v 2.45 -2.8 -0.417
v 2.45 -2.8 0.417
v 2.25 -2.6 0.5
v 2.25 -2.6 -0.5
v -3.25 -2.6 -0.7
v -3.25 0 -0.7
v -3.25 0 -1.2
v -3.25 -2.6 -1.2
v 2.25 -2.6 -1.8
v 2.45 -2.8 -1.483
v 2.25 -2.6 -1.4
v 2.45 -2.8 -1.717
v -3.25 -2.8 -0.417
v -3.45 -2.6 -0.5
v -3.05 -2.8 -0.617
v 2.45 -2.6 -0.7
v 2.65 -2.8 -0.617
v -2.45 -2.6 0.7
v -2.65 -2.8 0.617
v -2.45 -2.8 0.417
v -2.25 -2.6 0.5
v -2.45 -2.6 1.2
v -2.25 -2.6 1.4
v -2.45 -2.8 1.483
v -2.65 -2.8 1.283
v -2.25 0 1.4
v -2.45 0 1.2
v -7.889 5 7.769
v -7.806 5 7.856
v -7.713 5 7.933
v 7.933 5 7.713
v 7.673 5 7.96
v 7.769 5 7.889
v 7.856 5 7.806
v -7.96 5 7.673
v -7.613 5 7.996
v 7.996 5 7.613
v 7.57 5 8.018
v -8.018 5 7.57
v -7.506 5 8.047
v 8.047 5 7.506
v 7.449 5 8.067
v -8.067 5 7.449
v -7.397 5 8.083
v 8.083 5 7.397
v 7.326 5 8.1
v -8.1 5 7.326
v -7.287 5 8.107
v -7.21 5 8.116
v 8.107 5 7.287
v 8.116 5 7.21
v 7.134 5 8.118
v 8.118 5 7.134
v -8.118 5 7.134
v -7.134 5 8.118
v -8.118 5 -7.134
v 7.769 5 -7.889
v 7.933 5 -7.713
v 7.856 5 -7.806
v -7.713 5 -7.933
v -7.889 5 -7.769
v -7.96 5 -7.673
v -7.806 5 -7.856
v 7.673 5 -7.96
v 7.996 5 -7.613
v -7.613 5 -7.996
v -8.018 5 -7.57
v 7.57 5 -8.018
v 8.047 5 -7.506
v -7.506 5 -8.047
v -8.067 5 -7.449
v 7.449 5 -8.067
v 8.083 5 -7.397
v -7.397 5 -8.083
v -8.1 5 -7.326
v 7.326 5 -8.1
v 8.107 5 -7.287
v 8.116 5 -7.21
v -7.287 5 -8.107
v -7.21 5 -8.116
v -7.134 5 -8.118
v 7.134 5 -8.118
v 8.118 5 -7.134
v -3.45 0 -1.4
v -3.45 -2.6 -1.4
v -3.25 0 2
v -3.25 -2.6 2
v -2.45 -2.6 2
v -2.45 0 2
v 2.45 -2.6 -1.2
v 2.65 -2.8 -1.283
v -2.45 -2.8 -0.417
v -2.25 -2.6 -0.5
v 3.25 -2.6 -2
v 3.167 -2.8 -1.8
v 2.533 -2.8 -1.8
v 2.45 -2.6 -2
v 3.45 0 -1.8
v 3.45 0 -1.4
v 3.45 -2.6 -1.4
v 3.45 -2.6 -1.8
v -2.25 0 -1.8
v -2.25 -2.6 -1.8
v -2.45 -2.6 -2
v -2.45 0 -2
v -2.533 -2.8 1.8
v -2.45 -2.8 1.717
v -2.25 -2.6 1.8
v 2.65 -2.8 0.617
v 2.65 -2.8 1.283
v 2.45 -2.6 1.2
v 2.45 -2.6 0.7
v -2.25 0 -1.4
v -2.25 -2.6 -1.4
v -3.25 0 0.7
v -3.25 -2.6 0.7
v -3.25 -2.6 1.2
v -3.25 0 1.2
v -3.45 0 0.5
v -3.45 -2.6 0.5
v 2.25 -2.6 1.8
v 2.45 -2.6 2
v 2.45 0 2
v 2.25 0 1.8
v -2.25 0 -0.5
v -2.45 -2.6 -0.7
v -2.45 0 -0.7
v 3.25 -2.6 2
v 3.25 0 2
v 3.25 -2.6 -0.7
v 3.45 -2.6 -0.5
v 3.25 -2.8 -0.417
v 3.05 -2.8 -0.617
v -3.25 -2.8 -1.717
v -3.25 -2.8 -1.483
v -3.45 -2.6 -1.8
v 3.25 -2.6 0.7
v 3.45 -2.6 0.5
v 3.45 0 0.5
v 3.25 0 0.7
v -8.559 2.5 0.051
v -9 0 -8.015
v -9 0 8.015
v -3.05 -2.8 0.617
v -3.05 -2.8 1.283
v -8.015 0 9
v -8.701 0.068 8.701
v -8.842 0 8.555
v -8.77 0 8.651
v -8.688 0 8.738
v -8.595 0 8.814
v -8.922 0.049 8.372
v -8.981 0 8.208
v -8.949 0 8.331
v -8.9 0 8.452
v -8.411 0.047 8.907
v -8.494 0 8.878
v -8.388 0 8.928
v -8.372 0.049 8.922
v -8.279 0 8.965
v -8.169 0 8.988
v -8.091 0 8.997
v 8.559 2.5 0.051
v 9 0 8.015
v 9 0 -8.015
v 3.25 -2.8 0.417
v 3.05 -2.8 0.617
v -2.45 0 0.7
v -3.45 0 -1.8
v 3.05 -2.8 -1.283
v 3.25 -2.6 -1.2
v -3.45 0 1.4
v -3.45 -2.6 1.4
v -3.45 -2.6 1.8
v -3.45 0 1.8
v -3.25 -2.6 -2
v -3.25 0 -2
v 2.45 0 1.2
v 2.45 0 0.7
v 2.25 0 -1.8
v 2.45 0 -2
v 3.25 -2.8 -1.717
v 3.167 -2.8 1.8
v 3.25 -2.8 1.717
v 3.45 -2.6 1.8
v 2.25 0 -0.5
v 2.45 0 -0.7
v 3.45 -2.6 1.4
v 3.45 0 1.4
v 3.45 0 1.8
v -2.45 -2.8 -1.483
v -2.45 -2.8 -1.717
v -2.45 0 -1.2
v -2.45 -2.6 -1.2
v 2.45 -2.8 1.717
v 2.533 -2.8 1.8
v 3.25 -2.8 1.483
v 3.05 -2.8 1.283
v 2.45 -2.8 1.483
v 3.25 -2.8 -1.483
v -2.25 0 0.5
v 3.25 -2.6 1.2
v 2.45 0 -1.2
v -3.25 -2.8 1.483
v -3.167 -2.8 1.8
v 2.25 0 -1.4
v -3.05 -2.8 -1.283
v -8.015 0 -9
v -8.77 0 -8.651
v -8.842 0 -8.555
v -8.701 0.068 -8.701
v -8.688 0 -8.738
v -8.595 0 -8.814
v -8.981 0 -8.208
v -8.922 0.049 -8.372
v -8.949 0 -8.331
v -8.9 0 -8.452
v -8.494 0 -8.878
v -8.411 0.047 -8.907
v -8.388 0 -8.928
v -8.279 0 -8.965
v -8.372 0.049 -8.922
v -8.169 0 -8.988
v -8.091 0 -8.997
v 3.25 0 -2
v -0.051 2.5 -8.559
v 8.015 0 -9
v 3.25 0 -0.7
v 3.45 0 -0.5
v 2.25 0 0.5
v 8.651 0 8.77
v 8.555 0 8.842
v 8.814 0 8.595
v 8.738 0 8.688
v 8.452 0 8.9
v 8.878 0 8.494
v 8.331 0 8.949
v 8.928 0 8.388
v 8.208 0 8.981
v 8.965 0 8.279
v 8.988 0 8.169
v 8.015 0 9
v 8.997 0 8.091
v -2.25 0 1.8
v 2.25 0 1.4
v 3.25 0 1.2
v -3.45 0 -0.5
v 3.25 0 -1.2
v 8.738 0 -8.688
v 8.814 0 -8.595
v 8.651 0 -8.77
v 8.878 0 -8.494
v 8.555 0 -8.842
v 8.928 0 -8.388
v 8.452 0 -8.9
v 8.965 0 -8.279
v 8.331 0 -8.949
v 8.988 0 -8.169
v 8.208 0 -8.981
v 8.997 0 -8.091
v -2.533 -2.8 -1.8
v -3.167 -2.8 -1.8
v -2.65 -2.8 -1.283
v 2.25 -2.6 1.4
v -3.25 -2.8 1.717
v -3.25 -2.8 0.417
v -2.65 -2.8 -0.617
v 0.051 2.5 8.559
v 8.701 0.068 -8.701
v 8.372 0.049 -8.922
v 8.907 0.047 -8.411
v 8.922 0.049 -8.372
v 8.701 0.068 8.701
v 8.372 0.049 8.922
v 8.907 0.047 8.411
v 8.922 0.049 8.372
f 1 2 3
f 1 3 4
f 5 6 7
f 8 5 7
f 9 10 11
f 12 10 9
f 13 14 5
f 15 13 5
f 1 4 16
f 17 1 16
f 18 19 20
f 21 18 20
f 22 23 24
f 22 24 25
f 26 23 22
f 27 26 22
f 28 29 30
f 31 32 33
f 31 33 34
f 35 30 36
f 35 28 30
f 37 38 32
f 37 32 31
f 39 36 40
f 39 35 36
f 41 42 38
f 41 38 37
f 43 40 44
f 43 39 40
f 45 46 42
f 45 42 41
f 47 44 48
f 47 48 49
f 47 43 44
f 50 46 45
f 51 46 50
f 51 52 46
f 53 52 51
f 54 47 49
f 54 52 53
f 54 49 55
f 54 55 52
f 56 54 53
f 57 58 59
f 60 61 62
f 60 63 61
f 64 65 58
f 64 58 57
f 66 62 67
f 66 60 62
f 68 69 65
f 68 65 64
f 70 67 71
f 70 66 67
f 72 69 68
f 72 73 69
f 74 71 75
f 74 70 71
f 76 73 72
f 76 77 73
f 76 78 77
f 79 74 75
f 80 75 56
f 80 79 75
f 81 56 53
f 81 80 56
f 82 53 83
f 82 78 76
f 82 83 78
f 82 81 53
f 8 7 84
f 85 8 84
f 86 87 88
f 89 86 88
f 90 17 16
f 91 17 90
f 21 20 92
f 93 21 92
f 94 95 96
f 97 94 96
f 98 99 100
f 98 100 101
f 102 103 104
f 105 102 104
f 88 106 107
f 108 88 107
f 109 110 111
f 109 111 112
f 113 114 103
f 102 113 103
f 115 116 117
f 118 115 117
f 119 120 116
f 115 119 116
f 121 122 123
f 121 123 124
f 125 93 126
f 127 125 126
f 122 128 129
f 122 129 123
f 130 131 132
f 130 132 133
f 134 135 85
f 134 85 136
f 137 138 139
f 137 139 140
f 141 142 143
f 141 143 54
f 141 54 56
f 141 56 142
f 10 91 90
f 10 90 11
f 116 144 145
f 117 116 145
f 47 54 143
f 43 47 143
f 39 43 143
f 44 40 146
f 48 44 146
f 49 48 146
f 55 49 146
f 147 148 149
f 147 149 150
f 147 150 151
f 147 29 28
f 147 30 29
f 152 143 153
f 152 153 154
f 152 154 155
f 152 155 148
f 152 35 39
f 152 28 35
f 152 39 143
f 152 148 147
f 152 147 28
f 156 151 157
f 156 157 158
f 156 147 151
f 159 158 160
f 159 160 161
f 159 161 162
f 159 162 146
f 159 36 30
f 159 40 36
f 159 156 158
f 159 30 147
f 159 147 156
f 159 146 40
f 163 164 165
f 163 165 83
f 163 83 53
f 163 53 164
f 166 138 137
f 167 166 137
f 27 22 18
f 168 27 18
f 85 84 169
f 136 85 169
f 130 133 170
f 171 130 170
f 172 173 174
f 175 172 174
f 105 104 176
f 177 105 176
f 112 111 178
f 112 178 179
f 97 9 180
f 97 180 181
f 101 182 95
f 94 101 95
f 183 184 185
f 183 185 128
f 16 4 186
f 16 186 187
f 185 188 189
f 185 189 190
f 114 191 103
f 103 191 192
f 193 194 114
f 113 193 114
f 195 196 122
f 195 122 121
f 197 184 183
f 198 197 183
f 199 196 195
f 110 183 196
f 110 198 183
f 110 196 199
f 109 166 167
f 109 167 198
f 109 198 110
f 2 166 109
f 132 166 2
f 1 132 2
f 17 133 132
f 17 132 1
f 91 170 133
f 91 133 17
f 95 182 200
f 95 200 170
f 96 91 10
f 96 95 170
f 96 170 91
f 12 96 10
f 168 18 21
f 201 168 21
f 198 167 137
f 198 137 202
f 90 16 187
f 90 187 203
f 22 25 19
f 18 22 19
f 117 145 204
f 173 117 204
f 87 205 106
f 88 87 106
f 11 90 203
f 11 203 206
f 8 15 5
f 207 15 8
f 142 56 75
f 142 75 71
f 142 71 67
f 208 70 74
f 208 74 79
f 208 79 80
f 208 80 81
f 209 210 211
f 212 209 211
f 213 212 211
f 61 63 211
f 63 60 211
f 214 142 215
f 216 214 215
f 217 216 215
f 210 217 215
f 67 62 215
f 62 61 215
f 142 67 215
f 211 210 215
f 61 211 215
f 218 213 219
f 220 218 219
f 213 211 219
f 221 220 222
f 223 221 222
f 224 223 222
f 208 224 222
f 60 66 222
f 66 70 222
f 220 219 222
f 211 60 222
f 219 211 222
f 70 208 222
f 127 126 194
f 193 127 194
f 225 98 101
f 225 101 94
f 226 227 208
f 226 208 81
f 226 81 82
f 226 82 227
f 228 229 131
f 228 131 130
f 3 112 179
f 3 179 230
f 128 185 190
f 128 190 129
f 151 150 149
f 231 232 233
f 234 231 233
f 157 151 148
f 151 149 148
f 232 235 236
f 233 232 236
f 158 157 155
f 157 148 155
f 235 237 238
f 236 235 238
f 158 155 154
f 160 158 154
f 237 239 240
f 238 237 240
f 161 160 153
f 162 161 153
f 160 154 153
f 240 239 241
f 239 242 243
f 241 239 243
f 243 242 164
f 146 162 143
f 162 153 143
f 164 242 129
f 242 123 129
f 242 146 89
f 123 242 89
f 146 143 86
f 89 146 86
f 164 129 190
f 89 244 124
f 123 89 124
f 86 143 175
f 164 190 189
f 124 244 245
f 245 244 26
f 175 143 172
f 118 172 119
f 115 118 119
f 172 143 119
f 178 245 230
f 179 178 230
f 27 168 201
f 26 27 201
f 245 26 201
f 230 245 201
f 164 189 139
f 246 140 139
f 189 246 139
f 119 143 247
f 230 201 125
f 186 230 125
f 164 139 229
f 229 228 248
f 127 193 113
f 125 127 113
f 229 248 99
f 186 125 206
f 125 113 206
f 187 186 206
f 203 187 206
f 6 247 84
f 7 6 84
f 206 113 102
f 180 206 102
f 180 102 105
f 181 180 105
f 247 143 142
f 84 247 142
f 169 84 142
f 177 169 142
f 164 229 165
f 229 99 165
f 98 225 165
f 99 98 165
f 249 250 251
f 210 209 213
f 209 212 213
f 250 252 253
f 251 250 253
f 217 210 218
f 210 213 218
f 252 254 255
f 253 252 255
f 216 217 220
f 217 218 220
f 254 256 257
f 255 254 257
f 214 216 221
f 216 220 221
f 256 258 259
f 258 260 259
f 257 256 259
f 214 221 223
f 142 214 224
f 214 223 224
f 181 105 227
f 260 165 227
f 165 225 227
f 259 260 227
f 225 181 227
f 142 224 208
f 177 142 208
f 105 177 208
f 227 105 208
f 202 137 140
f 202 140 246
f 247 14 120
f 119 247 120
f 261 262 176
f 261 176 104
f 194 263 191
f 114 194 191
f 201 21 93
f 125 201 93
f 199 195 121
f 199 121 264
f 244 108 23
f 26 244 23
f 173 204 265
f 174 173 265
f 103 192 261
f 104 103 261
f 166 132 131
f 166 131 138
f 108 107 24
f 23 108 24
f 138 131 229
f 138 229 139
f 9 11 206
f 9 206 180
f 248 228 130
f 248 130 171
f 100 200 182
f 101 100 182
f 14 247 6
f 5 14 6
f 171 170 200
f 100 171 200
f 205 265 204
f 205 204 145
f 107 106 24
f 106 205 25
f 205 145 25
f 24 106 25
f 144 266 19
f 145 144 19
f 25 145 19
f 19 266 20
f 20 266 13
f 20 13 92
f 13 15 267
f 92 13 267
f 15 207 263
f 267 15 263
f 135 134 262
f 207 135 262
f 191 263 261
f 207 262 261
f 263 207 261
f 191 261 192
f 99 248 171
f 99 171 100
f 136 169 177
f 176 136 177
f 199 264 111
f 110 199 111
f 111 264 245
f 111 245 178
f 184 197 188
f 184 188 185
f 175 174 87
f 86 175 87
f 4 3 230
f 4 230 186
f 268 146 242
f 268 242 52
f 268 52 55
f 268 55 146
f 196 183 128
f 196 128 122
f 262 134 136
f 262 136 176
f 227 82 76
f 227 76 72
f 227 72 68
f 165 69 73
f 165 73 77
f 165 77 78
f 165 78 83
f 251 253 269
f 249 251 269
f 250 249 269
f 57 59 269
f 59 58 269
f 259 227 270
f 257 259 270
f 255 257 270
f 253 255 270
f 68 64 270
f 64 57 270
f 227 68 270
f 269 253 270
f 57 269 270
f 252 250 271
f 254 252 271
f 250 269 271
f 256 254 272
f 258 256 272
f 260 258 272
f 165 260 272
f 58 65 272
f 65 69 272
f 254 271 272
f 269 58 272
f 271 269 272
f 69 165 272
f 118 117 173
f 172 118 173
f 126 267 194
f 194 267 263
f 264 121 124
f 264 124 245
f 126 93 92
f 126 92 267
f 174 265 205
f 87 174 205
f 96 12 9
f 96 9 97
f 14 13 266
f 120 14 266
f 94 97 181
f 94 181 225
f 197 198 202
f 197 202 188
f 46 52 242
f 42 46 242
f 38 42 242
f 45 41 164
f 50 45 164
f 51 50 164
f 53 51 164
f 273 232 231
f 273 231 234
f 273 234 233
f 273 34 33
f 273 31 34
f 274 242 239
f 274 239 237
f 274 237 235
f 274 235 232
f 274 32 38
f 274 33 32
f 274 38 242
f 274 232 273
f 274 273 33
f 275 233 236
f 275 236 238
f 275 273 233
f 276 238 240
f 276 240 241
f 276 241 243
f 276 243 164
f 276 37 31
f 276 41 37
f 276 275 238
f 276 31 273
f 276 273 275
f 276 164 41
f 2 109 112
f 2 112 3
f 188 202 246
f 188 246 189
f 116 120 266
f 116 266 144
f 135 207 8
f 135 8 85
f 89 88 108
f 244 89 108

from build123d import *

# Parameters (mm, degrees)
BOSS_EXTRUDE1_DEPTH = 2.8
MIRROR1_START       = -2.8
MIRROR1_DEPTH       = 2.8
CHAMFER2_SIZE       = 0.2
BOSS_EXTRUDE2_DEPTH = 1
SKETCH2_W           = 18
SKETCH2_H           = 18
BOSS_EXTRUDE3_DEPTH = 5
BOSS_EXTRUDE3_TAPER = 10
FILLET1_R           = 1


# Read off the part's stored shape, not the designer's step: Mirror1
with BuildPart() as part:
    # Sketch1 → Boss-Extrude1 (new body)
    with BuildSketch(Plane(origin=(0, 0, 0), x_dir=(1, 0, 0), z_dir=(0, 1, 0))):
        Polygon((-2.85, 0), (-3.45, 0), (-3.45, 0.5), (-3.25, 0.7), (-3.25, 1.2), (-3.45, 1.4), (-3.45, 1.8), (-3.25, 2), (-2.85, 2), align=None)
    extrude(amount=-BOSS_EXTRUDE1_DEPTH)

    # Mirror1 outline → Mirror1 (add)
    with BuildSketch(Plane(origin=(0, 0, 0), x_dir=(1, 0, 0), z_dir=(0, 1, 0)).offset(MIRROR1_START)):
        Polygon((-2.85, 0), (-3.45, 0), (-3.45, -0.5), (-3.25, -0.7), (-3.25, -1.2), (-3.45, -1.4), (-3.45, -1.8), (-3.25, -2), (-2.45, -2), (-2.25, -1.8), (-2.25, -1.4), (-2.45, -1.2), (-2.45, -0.7), (-2.25, -0.5), (-2.25, 0.5), (-2.45, 0.7), (-2.45, 1.2), (-2.25, 1.4), (-2.25, 1.8), (-2.45, 2), (-2.85, 2), align=None)
    extrude(amount=MIRROR1_DEPTH)

    # Chamfer2
    chamfer2_edges = [part.edges().sort_by_distance(p)[0] for p in [
        (-2.85, -2.8, -2),
        (-3.35, -2.8, -1.9),
        (-3.45, -2.8, -1.6),
        (-3.35, -2.8, -1.3),
        (-3.25, -2.8, -0.95),
        (-2.35, -2.8, -0.6),
        (-2.25, -2.8, 0),
        (-2.35, -2.8, 0.6),
        (-2.85, -2.8, 2),
        (-3.35, -2.8, 1.9),
        (-3.45, -2.8, 1.6),
        (-3.35, -2.8, 1.3),
        (-3.25, -2.8, 0.95),
        (-2.35, -2.8, -1.9),
        (-2.25, -2.8, -1.6),
        (-2.35, -2.8, -1.3),
        (-2.45, -2.8, -0.95),
        (-3.35, -2.8, 0.6),
        (-3.35, -2.8, -0.6),
        (-2.45, -2.8, 0.95),
        (-2.35, -2.8, 1.3),
        (-2.25, -2.8, 1.6),
        (-2.35, -2.8, 1.9),
        (-3.45, -2.8, 0),
    ]]
    chamfer(chamfer2_edges, length=CHAMFER2_SIZE)


with BuildPart() as body_2:
    # Mirror5: mirrored copy
    add(part.part.mirror(Plane(origin=(0, 0, 0), x_dir=(0, 0, 1), z_dir=(1, 0, 0))))


with BuildPart() as part_1:
    add(part.part)

    add(body_2.part)  # Boss-Extrude2 merges body 2
    # Sketch1<4> → Boss-Extrude2 (add)
    # profile 1 of 2: a face of its own
    with BuildSketch(Plane(origin=(0, 0, 0), x_dir=(1, 0, 0), z_dir=(0, 1, 0))):
        Polygon((-5, 1.7), (-4.6, 2.1), (4.6, 2.1), (5, 1.7), (5, -1.7), (4.6, -2.1), (-4.6, -2.1), (-5, -1.7), align=None)
        Polygon((-2.85, 2), (-2.85, 0), (-3.45, 0), (-3.45, 0.5), (-3.25, 0.7), (-3.25, 1.2), (-3.45, 1.4), (-3.45, 1.8), (-3.25, 2), align=None, mode=Mode.SUBTRACT)
    # profile 2 of 2: a face of its own
    with BuildSketch(Plane(origin=(0, 0, 0), x_dir=(1, 0, 0), z_dir=(0, 1, 0))):
        Polygon((-2.85, 0), (-3.45, 0), (-3.45, 0.5), (-3.25, 0.7), (-3.25, 1.2), (-3.45, 1.4), (-3.45, 1.8), (-3.25, 2), (-2.85, 2), align=None)
    extrude(amount=BOSS_EXTRUDE2_DEPTH)

    # Sketch2 → Boss-Extrude3 (add)
    with BuildSketch(Plane(origin=(0, 0, 0), x_dir=(1, 0, 0), z_dir=(0, 1, 0))):
        Rectangle(SKETCH2_W, SKETCH2_H)
    extrude(amount=BOSS_EXTRUDE3_DEPTH, taper=BOSS_EXTRUDE3_TAPER)

    # Fillet1
    fillet1_edges = [part_1.edges().sort_by_distance(p)[0] for p in [
        (8.559182548, 2.5, 8.559182548),
        (8.559182548, 2.5, -8.559182548),
        (-8.559182548, 2.5, -8.559182548),
        (-8.559182548, 2.5, 8.559182548),
    ]]
    fillet(fillet1_edges, radius=FILLET1_R)


solid = part_1.part
